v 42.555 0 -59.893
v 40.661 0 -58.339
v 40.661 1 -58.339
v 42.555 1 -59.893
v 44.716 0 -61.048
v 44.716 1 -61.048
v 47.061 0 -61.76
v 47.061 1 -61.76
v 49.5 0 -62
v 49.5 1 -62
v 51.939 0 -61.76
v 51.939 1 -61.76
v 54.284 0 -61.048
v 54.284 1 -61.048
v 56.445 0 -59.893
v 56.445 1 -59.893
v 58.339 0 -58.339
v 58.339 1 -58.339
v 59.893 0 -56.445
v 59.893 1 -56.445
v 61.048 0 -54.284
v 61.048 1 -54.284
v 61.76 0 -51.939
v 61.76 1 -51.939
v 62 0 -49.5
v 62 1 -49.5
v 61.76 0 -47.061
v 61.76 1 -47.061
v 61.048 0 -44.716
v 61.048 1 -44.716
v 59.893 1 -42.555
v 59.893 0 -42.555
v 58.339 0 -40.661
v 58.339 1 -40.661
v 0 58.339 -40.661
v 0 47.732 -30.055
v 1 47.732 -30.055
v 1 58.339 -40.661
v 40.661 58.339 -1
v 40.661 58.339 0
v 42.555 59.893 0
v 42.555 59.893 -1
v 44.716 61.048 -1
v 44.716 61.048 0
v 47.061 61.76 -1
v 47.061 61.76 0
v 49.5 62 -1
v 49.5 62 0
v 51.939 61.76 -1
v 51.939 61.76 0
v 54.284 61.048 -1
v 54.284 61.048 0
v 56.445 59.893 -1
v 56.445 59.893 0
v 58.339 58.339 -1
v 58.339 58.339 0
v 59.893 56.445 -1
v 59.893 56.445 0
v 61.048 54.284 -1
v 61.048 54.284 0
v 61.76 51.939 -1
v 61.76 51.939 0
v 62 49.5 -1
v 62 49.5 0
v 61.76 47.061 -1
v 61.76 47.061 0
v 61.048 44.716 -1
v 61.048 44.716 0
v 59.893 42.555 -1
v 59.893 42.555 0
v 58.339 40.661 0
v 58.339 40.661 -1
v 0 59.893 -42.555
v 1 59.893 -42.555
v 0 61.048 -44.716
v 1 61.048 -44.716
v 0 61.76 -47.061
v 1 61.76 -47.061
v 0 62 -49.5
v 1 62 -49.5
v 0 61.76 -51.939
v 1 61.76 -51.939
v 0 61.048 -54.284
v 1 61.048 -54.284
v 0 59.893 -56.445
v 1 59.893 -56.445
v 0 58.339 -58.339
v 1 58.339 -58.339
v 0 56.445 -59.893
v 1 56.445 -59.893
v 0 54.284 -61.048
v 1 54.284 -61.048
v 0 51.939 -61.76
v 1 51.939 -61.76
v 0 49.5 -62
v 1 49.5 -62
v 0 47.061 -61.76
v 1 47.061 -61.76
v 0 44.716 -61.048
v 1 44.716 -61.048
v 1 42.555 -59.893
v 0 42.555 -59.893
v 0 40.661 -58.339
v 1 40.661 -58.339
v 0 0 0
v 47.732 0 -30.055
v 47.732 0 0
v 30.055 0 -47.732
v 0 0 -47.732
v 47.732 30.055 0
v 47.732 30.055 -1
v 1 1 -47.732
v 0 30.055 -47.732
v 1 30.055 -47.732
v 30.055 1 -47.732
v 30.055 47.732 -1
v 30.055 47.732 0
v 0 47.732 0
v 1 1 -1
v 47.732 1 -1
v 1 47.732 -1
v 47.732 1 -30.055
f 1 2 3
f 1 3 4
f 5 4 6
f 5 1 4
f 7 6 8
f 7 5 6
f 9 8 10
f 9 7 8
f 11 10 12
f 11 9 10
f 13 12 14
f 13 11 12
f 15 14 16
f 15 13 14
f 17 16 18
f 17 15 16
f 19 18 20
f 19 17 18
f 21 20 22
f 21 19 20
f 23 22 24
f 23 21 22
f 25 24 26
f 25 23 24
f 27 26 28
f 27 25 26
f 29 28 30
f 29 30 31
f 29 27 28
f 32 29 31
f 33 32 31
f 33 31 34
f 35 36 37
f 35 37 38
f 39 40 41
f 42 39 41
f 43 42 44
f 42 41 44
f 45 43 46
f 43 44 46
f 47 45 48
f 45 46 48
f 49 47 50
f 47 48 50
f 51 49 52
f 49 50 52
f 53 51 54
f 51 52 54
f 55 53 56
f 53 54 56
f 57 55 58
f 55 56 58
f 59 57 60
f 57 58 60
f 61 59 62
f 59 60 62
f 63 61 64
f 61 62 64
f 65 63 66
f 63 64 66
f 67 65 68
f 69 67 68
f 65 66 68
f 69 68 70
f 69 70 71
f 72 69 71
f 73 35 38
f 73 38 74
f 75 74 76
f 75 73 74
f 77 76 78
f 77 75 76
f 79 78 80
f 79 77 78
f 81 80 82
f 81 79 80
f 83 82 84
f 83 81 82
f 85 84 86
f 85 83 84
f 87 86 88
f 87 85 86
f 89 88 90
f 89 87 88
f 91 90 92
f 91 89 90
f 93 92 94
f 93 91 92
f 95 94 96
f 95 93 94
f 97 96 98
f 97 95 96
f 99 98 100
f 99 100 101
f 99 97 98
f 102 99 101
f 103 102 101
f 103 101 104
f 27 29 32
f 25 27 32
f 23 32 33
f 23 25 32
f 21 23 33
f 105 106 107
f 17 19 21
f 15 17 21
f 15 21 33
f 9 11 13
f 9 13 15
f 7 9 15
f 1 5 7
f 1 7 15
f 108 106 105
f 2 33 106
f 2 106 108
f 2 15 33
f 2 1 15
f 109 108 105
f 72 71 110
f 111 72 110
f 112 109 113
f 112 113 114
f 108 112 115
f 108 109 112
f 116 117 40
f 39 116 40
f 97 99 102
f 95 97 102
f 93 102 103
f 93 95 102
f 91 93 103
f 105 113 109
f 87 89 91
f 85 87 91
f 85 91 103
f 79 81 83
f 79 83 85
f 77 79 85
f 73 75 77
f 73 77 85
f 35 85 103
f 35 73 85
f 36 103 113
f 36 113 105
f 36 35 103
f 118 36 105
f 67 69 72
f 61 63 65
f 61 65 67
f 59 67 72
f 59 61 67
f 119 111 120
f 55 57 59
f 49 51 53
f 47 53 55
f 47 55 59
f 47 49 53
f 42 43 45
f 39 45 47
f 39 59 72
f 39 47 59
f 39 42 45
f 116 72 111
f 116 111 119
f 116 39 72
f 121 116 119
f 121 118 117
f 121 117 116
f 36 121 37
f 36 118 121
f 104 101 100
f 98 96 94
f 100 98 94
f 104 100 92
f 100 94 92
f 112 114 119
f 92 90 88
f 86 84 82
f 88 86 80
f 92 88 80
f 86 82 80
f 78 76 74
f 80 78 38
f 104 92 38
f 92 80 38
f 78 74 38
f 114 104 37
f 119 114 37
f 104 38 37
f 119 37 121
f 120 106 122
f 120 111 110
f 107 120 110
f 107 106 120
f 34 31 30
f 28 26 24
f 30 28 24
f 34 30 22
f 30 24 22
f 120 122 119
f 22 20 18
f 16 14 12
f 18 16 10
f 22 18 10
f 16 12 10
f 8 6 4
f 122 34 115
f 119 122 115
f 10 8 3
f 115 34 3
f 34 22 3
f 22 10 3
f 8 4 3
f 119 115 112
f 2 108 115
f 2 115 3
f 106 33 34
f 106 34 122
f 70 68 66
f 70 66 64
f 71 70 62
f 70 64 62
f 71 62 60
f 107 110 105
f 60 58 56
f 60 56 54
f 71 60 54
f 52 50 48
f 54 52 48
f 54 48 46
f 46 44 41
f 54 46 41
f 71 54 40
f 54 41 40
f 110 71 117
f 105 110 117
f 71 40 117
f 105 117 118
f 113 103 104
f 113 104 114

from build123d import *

# Parameters (mm, degrees)
BOSS_EXTRUDE1_DEPTH = 1
BOSS_EXTRUDE2_DEPTH = 1
BOSS_EXTRUDE3_DEPTH = 1


with BuildPart() as part:
    # Sketch1 → Boss-Extrude1 (new body)
    with BuildSketch(Plane.XY):
        with BuildLine():
            Line((30.054563517, 47.732233047), (40.661165235, 58.338834765))
            ThreePointArc((40.661165235, 58.338834765), (58.338834765, 58.338834765), (58.338834765, 40.661165235))
            Line((58.338834765, 40.661165235), (47.732233047, 30.054563517))
            Line((47.732233047, 30.054563517), (47.732233047, 0))
            Line((47.732233047, 0), (0, 0))
            Line((0, 0), (0, 47.732233047))
            Line((0, 47.732233047), (30.054563517, 47.732233047))
        make_face()
    extrude(amount=-BOSS_EXTRUDE1_DEPTH)

    # Sketch2 → Boss-Extrude2 (add)
    with BuildSketch(Plane(origin=(0, 0, 0), x_dir=(0, 0, -1), z_dir=(1, 0, 0))):
        with BuildLine():
            Line((30.054563517, 47.732233047), (40.661165235, 58.338834765))
            ThreePointArc((40.661165235, 58.338834765), (58.338834765, 58.338834765), (58.338834765, 40.661165235))
            Line((58.338834765, 40.661165235), (47.732233047, 30.054563517))
            Line((47.732233047, 30.054563517), (47.732233047, 0))
            Line((47.732233047, 0), (0, 0))
            Line((0, 0), (0, 47.732233047))
            Line((0, 47.732233047), (30.054563517, 47.732233047))
        make_face()
    extrude(amount=BOSS_EXTRUDE2_DEPTH)

    # Sketch3 → Boss-Extrude3 (add)
    with BuildSketch(Plane(origin=(0, 0, 0), x_dir=(1, 0, 0), z_dir=(0, 1, 0))):
        with BuildLine():
            Line((30.054563517, 47.732233047), (40.661165235, 58.338834765))
            ThreePointArc((40.661165235, 58.338834765), (58.338834765, 58.338834765), (58.338834765, 40.661165235))
            Line((58.338834765, 40.661165235), (47.732233047, 30.054563517))
            Line((47.732233047, 30.054563517), (47.732233047, 0))
            Line((47.732233047, 0), (0, 0))
            Line((0, 0), (0, 47.732233047))
            Line((0, 47.732233047), (30.054563517, 47.732233047))
        make_face()
    extrude(amount=BOSS_EXTRUDE3_DEPTH)


solid = part.part
